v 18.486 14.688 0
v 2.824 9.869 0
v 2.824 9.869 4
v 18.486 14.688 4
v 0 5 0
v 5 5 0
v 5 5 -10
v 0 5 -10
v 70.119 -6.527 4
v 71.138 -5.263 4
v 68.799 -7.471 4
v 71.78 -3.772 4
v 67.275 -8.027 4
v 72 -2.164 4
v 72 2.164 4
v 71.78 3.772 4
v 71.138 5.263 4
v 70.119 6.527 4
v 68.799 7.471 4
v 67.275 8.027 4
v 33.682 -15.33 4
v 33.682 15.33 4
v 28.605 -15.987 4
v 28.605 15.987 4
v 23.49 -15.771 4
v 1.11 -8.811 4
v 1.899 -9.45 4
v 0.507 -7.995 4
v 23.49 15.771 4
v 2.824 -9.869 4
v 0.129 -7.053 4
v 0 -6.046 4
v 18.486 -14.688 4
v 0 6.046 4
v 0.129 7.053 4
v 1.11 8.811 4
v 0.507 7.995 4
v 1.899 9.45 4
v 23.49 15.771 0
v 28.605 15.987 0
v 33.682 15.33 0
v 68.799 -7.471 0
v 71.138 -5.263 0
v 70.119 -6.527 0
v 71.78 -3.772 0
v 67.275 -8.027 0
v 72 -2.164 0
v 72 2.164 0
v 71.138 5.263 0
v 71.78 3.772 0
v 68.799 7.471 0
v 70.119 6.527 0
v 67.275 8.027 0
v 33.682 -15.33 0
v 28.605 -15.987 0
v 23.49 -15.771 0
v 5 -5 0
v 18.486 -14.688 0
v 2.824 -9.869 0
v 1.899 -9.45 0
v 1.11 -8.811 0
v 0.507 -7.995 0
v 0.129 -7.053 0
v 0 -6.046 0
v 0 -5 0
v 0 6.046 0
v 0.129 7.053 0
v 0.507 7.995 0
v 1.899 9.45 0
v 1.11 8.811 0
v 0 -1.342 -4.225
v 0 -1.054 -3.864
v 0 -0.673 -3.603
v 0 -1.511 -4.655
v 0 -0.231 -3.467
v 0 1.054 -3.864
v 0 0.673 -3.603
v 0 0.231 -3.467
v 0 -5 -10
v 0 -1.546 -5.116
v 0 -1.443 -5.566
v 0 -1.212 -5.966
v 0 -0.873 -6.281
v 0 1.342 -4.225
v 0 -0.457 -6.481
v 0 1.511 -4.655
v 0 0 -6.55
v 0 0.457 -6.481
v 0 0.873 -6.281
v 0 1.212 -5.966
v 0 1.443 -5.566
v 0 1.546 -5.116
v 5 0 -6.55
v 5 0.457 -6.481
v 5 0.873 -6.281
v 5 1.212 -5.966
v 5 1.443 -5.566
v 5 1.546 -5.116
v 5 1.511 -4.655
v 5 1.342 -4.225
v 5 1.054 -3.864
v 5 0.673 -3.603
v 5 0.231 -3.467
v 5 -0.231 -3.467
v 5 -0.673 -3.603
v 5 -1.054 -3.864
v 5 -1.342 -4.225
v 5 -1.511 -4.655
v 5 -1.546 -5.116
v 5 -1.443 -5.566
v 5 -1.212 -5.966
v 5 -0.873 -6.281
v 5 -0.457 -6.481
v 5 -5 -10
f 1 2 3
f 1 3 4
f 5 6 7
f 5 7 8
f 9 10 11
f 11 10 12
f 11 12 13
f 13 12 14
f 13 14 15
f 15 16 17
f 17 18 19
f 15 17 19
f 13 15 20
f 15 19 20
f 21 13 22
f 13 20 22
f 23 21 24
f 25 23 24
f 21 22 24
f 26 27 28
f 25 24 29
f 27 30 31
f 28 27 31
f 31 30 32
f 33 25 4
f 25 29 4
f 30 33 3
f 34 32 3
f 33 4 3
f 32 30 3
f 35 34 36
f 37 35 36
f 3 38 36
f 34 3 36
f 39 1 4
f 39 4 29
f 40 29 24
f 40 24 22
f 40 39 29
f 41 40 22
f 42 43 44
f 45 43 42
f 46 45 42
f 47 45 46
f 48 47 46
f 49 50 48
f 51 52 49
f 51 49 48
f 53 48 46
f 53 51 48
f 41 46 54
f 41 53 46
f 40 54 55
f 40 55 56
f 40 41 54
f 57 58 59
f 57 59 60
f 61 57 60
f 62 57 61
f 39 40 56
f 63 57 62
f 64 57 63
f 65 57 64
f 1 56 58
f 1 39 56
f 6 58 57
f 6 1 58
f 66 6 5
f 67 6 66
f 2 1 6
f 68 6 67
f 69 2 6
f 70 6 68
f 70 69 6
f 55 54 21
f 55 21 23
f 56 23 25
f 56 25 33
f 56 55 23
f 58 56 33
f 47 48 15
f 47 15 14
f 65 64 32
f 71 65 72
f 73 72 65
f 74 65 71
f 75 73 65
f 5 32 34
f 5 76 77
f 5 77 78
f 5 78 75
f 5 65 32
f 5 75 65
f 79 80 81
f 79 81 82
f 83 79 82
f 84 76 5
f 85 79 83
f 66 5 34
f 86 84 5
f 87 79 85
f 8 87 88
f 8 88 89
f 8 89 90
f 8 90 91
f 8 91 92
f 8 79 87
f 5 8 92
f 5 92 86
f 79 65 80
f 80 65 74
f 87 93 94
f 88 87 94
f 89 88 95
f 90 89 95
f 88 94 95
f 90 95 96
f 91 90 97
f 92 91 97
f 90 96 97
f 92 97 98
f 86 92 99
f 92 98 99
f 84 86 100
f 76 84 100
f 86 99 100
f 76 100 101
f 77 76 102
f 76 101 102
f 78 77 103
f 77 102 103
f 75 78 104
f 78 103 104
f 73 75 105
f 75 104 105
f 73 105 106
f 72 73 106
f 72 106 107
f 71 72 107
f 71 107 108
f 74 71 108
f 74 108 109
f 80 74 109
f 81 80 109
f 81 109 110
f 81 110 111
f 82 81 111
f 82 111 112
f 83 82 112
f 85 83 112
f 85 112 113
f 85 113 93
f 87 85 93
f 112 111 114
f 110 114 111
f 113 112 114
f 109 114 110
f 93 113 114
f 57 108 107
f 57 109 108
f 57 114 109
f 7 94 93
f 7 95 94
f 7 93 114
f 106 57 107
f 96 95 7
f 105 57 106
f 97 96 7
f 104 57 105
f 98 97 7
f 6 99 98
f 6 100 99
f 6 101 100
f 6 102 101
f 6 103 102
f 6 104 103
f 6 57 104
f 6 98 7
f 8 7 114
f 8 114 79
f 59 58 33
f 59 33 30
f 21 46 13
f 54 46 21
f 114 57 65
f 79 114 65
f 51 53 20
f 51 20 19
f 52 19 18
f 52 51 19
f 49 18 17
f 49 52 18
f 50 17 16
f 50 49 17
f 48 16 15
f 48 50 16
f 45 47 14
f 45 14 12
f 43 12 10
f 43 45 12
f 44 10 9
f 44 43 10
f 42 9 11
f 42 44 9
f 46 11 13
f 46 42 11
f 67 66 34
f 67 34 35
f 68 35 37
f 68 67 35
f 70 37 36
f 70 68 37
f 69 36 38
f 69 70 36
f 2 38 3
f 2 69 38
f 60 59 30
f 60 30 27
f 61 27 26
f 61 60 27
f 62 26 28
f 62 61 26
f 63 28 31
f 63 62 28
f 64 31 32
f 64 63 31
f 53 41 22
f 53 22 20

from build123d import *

# Parameters (mm, degrees)
BOSS_EXTRUDE1_DEPTH = 4
SKETCH2_W           = 5
SKETCH2_H           = 10
BOSS_EXTRUDE2_DEPTH = 10
CUT_EXTRUDE1_REACH  = 7
SKETCH3_R           = 1.55


with BuildPart() as part:
    # Sketch1 → Boss-Extrude1 (new body)
    with BuildSketch(Plane.XY):
        with BuildLine():
            Line((2.823656605, 9.868817417), (18.486372689, 14.688114674))
            ThreePointArc((18.486372689, 14.688114674), (26.042750669, 15.988011567), (33.681837484, 15.33003533))
            Line((33.681837484, 15.33003533), (67.274577866, 8.027265681))
            ThreePointArc((67.274577866, 8.027265681), (70.67158791, 5.929345796), (72, 2.164207498))
            Line((72, 2.164207498), (72, -2.164207498))
            ThreePointArc((72, -2.164207498), (70.67158791, -5.929345796), (67.274577866, -8.027265681))
            Line((67.274577866, -8.027265681), (33.681837484, -15.33003533))
            ThreePointArc((33.681837484, -15.33003533), (26.042750669, -15.988011567), (18.486372689, -14.688114674))
            Line((18.486372689, -14.688114674), (2.823656605, -9.868817417))
            ThreePointArc((2.823656605, -9.868817417), (0.782440864, -8.422109009), (0, -6.045701382))
            Line((0, -6.045701382), (0, 6.045701382))
            ThreePointArc((0, 6.045701382), (0.782440864, 8.422109009), (2.823656605, 9.868817417))
        make_face()
    extrude(amount=BOSS_EXTRUDE1_DEPTH)

    # Sketch2 → Boss-Extrude2 (add)
    with BuildSketch(Plane(origin=(0, 0, 0), x_dir=(-1, 0, 0), z_dir=(0, 0, -1))):
        with Locations((-2.5, 0)):
            Rectangle(SKETCH2_W, SKETCH2_H)
    extrude(amount=BOSS_EXTRUDE2_DEPTH)

    # Sketch3 → Cut-Extrude1 (cut, up to next)
    with BuildSketch(Plane(origin=(5, 0, 0), x_dir=(0, 0, -1), z_dir=(1, 0, 0)), mode=Mode.PRIVATE) as cut_extrude1_sk1:
        with Locations((5, 0)):
            Circle(SKETCH3_R)
    cut_extrude1_tool1 = extrude(cut_extrude1_sk1.sketch, amount=-CUT_EXTRUDE1_REACH, mode=Mode.PRIVATE) & part.part
    add(cut_extrude1_tool1.solids().sort_by_distance((5, 0, -5))[0], mode=Mode.SUBTRACT)


solid = part.part
